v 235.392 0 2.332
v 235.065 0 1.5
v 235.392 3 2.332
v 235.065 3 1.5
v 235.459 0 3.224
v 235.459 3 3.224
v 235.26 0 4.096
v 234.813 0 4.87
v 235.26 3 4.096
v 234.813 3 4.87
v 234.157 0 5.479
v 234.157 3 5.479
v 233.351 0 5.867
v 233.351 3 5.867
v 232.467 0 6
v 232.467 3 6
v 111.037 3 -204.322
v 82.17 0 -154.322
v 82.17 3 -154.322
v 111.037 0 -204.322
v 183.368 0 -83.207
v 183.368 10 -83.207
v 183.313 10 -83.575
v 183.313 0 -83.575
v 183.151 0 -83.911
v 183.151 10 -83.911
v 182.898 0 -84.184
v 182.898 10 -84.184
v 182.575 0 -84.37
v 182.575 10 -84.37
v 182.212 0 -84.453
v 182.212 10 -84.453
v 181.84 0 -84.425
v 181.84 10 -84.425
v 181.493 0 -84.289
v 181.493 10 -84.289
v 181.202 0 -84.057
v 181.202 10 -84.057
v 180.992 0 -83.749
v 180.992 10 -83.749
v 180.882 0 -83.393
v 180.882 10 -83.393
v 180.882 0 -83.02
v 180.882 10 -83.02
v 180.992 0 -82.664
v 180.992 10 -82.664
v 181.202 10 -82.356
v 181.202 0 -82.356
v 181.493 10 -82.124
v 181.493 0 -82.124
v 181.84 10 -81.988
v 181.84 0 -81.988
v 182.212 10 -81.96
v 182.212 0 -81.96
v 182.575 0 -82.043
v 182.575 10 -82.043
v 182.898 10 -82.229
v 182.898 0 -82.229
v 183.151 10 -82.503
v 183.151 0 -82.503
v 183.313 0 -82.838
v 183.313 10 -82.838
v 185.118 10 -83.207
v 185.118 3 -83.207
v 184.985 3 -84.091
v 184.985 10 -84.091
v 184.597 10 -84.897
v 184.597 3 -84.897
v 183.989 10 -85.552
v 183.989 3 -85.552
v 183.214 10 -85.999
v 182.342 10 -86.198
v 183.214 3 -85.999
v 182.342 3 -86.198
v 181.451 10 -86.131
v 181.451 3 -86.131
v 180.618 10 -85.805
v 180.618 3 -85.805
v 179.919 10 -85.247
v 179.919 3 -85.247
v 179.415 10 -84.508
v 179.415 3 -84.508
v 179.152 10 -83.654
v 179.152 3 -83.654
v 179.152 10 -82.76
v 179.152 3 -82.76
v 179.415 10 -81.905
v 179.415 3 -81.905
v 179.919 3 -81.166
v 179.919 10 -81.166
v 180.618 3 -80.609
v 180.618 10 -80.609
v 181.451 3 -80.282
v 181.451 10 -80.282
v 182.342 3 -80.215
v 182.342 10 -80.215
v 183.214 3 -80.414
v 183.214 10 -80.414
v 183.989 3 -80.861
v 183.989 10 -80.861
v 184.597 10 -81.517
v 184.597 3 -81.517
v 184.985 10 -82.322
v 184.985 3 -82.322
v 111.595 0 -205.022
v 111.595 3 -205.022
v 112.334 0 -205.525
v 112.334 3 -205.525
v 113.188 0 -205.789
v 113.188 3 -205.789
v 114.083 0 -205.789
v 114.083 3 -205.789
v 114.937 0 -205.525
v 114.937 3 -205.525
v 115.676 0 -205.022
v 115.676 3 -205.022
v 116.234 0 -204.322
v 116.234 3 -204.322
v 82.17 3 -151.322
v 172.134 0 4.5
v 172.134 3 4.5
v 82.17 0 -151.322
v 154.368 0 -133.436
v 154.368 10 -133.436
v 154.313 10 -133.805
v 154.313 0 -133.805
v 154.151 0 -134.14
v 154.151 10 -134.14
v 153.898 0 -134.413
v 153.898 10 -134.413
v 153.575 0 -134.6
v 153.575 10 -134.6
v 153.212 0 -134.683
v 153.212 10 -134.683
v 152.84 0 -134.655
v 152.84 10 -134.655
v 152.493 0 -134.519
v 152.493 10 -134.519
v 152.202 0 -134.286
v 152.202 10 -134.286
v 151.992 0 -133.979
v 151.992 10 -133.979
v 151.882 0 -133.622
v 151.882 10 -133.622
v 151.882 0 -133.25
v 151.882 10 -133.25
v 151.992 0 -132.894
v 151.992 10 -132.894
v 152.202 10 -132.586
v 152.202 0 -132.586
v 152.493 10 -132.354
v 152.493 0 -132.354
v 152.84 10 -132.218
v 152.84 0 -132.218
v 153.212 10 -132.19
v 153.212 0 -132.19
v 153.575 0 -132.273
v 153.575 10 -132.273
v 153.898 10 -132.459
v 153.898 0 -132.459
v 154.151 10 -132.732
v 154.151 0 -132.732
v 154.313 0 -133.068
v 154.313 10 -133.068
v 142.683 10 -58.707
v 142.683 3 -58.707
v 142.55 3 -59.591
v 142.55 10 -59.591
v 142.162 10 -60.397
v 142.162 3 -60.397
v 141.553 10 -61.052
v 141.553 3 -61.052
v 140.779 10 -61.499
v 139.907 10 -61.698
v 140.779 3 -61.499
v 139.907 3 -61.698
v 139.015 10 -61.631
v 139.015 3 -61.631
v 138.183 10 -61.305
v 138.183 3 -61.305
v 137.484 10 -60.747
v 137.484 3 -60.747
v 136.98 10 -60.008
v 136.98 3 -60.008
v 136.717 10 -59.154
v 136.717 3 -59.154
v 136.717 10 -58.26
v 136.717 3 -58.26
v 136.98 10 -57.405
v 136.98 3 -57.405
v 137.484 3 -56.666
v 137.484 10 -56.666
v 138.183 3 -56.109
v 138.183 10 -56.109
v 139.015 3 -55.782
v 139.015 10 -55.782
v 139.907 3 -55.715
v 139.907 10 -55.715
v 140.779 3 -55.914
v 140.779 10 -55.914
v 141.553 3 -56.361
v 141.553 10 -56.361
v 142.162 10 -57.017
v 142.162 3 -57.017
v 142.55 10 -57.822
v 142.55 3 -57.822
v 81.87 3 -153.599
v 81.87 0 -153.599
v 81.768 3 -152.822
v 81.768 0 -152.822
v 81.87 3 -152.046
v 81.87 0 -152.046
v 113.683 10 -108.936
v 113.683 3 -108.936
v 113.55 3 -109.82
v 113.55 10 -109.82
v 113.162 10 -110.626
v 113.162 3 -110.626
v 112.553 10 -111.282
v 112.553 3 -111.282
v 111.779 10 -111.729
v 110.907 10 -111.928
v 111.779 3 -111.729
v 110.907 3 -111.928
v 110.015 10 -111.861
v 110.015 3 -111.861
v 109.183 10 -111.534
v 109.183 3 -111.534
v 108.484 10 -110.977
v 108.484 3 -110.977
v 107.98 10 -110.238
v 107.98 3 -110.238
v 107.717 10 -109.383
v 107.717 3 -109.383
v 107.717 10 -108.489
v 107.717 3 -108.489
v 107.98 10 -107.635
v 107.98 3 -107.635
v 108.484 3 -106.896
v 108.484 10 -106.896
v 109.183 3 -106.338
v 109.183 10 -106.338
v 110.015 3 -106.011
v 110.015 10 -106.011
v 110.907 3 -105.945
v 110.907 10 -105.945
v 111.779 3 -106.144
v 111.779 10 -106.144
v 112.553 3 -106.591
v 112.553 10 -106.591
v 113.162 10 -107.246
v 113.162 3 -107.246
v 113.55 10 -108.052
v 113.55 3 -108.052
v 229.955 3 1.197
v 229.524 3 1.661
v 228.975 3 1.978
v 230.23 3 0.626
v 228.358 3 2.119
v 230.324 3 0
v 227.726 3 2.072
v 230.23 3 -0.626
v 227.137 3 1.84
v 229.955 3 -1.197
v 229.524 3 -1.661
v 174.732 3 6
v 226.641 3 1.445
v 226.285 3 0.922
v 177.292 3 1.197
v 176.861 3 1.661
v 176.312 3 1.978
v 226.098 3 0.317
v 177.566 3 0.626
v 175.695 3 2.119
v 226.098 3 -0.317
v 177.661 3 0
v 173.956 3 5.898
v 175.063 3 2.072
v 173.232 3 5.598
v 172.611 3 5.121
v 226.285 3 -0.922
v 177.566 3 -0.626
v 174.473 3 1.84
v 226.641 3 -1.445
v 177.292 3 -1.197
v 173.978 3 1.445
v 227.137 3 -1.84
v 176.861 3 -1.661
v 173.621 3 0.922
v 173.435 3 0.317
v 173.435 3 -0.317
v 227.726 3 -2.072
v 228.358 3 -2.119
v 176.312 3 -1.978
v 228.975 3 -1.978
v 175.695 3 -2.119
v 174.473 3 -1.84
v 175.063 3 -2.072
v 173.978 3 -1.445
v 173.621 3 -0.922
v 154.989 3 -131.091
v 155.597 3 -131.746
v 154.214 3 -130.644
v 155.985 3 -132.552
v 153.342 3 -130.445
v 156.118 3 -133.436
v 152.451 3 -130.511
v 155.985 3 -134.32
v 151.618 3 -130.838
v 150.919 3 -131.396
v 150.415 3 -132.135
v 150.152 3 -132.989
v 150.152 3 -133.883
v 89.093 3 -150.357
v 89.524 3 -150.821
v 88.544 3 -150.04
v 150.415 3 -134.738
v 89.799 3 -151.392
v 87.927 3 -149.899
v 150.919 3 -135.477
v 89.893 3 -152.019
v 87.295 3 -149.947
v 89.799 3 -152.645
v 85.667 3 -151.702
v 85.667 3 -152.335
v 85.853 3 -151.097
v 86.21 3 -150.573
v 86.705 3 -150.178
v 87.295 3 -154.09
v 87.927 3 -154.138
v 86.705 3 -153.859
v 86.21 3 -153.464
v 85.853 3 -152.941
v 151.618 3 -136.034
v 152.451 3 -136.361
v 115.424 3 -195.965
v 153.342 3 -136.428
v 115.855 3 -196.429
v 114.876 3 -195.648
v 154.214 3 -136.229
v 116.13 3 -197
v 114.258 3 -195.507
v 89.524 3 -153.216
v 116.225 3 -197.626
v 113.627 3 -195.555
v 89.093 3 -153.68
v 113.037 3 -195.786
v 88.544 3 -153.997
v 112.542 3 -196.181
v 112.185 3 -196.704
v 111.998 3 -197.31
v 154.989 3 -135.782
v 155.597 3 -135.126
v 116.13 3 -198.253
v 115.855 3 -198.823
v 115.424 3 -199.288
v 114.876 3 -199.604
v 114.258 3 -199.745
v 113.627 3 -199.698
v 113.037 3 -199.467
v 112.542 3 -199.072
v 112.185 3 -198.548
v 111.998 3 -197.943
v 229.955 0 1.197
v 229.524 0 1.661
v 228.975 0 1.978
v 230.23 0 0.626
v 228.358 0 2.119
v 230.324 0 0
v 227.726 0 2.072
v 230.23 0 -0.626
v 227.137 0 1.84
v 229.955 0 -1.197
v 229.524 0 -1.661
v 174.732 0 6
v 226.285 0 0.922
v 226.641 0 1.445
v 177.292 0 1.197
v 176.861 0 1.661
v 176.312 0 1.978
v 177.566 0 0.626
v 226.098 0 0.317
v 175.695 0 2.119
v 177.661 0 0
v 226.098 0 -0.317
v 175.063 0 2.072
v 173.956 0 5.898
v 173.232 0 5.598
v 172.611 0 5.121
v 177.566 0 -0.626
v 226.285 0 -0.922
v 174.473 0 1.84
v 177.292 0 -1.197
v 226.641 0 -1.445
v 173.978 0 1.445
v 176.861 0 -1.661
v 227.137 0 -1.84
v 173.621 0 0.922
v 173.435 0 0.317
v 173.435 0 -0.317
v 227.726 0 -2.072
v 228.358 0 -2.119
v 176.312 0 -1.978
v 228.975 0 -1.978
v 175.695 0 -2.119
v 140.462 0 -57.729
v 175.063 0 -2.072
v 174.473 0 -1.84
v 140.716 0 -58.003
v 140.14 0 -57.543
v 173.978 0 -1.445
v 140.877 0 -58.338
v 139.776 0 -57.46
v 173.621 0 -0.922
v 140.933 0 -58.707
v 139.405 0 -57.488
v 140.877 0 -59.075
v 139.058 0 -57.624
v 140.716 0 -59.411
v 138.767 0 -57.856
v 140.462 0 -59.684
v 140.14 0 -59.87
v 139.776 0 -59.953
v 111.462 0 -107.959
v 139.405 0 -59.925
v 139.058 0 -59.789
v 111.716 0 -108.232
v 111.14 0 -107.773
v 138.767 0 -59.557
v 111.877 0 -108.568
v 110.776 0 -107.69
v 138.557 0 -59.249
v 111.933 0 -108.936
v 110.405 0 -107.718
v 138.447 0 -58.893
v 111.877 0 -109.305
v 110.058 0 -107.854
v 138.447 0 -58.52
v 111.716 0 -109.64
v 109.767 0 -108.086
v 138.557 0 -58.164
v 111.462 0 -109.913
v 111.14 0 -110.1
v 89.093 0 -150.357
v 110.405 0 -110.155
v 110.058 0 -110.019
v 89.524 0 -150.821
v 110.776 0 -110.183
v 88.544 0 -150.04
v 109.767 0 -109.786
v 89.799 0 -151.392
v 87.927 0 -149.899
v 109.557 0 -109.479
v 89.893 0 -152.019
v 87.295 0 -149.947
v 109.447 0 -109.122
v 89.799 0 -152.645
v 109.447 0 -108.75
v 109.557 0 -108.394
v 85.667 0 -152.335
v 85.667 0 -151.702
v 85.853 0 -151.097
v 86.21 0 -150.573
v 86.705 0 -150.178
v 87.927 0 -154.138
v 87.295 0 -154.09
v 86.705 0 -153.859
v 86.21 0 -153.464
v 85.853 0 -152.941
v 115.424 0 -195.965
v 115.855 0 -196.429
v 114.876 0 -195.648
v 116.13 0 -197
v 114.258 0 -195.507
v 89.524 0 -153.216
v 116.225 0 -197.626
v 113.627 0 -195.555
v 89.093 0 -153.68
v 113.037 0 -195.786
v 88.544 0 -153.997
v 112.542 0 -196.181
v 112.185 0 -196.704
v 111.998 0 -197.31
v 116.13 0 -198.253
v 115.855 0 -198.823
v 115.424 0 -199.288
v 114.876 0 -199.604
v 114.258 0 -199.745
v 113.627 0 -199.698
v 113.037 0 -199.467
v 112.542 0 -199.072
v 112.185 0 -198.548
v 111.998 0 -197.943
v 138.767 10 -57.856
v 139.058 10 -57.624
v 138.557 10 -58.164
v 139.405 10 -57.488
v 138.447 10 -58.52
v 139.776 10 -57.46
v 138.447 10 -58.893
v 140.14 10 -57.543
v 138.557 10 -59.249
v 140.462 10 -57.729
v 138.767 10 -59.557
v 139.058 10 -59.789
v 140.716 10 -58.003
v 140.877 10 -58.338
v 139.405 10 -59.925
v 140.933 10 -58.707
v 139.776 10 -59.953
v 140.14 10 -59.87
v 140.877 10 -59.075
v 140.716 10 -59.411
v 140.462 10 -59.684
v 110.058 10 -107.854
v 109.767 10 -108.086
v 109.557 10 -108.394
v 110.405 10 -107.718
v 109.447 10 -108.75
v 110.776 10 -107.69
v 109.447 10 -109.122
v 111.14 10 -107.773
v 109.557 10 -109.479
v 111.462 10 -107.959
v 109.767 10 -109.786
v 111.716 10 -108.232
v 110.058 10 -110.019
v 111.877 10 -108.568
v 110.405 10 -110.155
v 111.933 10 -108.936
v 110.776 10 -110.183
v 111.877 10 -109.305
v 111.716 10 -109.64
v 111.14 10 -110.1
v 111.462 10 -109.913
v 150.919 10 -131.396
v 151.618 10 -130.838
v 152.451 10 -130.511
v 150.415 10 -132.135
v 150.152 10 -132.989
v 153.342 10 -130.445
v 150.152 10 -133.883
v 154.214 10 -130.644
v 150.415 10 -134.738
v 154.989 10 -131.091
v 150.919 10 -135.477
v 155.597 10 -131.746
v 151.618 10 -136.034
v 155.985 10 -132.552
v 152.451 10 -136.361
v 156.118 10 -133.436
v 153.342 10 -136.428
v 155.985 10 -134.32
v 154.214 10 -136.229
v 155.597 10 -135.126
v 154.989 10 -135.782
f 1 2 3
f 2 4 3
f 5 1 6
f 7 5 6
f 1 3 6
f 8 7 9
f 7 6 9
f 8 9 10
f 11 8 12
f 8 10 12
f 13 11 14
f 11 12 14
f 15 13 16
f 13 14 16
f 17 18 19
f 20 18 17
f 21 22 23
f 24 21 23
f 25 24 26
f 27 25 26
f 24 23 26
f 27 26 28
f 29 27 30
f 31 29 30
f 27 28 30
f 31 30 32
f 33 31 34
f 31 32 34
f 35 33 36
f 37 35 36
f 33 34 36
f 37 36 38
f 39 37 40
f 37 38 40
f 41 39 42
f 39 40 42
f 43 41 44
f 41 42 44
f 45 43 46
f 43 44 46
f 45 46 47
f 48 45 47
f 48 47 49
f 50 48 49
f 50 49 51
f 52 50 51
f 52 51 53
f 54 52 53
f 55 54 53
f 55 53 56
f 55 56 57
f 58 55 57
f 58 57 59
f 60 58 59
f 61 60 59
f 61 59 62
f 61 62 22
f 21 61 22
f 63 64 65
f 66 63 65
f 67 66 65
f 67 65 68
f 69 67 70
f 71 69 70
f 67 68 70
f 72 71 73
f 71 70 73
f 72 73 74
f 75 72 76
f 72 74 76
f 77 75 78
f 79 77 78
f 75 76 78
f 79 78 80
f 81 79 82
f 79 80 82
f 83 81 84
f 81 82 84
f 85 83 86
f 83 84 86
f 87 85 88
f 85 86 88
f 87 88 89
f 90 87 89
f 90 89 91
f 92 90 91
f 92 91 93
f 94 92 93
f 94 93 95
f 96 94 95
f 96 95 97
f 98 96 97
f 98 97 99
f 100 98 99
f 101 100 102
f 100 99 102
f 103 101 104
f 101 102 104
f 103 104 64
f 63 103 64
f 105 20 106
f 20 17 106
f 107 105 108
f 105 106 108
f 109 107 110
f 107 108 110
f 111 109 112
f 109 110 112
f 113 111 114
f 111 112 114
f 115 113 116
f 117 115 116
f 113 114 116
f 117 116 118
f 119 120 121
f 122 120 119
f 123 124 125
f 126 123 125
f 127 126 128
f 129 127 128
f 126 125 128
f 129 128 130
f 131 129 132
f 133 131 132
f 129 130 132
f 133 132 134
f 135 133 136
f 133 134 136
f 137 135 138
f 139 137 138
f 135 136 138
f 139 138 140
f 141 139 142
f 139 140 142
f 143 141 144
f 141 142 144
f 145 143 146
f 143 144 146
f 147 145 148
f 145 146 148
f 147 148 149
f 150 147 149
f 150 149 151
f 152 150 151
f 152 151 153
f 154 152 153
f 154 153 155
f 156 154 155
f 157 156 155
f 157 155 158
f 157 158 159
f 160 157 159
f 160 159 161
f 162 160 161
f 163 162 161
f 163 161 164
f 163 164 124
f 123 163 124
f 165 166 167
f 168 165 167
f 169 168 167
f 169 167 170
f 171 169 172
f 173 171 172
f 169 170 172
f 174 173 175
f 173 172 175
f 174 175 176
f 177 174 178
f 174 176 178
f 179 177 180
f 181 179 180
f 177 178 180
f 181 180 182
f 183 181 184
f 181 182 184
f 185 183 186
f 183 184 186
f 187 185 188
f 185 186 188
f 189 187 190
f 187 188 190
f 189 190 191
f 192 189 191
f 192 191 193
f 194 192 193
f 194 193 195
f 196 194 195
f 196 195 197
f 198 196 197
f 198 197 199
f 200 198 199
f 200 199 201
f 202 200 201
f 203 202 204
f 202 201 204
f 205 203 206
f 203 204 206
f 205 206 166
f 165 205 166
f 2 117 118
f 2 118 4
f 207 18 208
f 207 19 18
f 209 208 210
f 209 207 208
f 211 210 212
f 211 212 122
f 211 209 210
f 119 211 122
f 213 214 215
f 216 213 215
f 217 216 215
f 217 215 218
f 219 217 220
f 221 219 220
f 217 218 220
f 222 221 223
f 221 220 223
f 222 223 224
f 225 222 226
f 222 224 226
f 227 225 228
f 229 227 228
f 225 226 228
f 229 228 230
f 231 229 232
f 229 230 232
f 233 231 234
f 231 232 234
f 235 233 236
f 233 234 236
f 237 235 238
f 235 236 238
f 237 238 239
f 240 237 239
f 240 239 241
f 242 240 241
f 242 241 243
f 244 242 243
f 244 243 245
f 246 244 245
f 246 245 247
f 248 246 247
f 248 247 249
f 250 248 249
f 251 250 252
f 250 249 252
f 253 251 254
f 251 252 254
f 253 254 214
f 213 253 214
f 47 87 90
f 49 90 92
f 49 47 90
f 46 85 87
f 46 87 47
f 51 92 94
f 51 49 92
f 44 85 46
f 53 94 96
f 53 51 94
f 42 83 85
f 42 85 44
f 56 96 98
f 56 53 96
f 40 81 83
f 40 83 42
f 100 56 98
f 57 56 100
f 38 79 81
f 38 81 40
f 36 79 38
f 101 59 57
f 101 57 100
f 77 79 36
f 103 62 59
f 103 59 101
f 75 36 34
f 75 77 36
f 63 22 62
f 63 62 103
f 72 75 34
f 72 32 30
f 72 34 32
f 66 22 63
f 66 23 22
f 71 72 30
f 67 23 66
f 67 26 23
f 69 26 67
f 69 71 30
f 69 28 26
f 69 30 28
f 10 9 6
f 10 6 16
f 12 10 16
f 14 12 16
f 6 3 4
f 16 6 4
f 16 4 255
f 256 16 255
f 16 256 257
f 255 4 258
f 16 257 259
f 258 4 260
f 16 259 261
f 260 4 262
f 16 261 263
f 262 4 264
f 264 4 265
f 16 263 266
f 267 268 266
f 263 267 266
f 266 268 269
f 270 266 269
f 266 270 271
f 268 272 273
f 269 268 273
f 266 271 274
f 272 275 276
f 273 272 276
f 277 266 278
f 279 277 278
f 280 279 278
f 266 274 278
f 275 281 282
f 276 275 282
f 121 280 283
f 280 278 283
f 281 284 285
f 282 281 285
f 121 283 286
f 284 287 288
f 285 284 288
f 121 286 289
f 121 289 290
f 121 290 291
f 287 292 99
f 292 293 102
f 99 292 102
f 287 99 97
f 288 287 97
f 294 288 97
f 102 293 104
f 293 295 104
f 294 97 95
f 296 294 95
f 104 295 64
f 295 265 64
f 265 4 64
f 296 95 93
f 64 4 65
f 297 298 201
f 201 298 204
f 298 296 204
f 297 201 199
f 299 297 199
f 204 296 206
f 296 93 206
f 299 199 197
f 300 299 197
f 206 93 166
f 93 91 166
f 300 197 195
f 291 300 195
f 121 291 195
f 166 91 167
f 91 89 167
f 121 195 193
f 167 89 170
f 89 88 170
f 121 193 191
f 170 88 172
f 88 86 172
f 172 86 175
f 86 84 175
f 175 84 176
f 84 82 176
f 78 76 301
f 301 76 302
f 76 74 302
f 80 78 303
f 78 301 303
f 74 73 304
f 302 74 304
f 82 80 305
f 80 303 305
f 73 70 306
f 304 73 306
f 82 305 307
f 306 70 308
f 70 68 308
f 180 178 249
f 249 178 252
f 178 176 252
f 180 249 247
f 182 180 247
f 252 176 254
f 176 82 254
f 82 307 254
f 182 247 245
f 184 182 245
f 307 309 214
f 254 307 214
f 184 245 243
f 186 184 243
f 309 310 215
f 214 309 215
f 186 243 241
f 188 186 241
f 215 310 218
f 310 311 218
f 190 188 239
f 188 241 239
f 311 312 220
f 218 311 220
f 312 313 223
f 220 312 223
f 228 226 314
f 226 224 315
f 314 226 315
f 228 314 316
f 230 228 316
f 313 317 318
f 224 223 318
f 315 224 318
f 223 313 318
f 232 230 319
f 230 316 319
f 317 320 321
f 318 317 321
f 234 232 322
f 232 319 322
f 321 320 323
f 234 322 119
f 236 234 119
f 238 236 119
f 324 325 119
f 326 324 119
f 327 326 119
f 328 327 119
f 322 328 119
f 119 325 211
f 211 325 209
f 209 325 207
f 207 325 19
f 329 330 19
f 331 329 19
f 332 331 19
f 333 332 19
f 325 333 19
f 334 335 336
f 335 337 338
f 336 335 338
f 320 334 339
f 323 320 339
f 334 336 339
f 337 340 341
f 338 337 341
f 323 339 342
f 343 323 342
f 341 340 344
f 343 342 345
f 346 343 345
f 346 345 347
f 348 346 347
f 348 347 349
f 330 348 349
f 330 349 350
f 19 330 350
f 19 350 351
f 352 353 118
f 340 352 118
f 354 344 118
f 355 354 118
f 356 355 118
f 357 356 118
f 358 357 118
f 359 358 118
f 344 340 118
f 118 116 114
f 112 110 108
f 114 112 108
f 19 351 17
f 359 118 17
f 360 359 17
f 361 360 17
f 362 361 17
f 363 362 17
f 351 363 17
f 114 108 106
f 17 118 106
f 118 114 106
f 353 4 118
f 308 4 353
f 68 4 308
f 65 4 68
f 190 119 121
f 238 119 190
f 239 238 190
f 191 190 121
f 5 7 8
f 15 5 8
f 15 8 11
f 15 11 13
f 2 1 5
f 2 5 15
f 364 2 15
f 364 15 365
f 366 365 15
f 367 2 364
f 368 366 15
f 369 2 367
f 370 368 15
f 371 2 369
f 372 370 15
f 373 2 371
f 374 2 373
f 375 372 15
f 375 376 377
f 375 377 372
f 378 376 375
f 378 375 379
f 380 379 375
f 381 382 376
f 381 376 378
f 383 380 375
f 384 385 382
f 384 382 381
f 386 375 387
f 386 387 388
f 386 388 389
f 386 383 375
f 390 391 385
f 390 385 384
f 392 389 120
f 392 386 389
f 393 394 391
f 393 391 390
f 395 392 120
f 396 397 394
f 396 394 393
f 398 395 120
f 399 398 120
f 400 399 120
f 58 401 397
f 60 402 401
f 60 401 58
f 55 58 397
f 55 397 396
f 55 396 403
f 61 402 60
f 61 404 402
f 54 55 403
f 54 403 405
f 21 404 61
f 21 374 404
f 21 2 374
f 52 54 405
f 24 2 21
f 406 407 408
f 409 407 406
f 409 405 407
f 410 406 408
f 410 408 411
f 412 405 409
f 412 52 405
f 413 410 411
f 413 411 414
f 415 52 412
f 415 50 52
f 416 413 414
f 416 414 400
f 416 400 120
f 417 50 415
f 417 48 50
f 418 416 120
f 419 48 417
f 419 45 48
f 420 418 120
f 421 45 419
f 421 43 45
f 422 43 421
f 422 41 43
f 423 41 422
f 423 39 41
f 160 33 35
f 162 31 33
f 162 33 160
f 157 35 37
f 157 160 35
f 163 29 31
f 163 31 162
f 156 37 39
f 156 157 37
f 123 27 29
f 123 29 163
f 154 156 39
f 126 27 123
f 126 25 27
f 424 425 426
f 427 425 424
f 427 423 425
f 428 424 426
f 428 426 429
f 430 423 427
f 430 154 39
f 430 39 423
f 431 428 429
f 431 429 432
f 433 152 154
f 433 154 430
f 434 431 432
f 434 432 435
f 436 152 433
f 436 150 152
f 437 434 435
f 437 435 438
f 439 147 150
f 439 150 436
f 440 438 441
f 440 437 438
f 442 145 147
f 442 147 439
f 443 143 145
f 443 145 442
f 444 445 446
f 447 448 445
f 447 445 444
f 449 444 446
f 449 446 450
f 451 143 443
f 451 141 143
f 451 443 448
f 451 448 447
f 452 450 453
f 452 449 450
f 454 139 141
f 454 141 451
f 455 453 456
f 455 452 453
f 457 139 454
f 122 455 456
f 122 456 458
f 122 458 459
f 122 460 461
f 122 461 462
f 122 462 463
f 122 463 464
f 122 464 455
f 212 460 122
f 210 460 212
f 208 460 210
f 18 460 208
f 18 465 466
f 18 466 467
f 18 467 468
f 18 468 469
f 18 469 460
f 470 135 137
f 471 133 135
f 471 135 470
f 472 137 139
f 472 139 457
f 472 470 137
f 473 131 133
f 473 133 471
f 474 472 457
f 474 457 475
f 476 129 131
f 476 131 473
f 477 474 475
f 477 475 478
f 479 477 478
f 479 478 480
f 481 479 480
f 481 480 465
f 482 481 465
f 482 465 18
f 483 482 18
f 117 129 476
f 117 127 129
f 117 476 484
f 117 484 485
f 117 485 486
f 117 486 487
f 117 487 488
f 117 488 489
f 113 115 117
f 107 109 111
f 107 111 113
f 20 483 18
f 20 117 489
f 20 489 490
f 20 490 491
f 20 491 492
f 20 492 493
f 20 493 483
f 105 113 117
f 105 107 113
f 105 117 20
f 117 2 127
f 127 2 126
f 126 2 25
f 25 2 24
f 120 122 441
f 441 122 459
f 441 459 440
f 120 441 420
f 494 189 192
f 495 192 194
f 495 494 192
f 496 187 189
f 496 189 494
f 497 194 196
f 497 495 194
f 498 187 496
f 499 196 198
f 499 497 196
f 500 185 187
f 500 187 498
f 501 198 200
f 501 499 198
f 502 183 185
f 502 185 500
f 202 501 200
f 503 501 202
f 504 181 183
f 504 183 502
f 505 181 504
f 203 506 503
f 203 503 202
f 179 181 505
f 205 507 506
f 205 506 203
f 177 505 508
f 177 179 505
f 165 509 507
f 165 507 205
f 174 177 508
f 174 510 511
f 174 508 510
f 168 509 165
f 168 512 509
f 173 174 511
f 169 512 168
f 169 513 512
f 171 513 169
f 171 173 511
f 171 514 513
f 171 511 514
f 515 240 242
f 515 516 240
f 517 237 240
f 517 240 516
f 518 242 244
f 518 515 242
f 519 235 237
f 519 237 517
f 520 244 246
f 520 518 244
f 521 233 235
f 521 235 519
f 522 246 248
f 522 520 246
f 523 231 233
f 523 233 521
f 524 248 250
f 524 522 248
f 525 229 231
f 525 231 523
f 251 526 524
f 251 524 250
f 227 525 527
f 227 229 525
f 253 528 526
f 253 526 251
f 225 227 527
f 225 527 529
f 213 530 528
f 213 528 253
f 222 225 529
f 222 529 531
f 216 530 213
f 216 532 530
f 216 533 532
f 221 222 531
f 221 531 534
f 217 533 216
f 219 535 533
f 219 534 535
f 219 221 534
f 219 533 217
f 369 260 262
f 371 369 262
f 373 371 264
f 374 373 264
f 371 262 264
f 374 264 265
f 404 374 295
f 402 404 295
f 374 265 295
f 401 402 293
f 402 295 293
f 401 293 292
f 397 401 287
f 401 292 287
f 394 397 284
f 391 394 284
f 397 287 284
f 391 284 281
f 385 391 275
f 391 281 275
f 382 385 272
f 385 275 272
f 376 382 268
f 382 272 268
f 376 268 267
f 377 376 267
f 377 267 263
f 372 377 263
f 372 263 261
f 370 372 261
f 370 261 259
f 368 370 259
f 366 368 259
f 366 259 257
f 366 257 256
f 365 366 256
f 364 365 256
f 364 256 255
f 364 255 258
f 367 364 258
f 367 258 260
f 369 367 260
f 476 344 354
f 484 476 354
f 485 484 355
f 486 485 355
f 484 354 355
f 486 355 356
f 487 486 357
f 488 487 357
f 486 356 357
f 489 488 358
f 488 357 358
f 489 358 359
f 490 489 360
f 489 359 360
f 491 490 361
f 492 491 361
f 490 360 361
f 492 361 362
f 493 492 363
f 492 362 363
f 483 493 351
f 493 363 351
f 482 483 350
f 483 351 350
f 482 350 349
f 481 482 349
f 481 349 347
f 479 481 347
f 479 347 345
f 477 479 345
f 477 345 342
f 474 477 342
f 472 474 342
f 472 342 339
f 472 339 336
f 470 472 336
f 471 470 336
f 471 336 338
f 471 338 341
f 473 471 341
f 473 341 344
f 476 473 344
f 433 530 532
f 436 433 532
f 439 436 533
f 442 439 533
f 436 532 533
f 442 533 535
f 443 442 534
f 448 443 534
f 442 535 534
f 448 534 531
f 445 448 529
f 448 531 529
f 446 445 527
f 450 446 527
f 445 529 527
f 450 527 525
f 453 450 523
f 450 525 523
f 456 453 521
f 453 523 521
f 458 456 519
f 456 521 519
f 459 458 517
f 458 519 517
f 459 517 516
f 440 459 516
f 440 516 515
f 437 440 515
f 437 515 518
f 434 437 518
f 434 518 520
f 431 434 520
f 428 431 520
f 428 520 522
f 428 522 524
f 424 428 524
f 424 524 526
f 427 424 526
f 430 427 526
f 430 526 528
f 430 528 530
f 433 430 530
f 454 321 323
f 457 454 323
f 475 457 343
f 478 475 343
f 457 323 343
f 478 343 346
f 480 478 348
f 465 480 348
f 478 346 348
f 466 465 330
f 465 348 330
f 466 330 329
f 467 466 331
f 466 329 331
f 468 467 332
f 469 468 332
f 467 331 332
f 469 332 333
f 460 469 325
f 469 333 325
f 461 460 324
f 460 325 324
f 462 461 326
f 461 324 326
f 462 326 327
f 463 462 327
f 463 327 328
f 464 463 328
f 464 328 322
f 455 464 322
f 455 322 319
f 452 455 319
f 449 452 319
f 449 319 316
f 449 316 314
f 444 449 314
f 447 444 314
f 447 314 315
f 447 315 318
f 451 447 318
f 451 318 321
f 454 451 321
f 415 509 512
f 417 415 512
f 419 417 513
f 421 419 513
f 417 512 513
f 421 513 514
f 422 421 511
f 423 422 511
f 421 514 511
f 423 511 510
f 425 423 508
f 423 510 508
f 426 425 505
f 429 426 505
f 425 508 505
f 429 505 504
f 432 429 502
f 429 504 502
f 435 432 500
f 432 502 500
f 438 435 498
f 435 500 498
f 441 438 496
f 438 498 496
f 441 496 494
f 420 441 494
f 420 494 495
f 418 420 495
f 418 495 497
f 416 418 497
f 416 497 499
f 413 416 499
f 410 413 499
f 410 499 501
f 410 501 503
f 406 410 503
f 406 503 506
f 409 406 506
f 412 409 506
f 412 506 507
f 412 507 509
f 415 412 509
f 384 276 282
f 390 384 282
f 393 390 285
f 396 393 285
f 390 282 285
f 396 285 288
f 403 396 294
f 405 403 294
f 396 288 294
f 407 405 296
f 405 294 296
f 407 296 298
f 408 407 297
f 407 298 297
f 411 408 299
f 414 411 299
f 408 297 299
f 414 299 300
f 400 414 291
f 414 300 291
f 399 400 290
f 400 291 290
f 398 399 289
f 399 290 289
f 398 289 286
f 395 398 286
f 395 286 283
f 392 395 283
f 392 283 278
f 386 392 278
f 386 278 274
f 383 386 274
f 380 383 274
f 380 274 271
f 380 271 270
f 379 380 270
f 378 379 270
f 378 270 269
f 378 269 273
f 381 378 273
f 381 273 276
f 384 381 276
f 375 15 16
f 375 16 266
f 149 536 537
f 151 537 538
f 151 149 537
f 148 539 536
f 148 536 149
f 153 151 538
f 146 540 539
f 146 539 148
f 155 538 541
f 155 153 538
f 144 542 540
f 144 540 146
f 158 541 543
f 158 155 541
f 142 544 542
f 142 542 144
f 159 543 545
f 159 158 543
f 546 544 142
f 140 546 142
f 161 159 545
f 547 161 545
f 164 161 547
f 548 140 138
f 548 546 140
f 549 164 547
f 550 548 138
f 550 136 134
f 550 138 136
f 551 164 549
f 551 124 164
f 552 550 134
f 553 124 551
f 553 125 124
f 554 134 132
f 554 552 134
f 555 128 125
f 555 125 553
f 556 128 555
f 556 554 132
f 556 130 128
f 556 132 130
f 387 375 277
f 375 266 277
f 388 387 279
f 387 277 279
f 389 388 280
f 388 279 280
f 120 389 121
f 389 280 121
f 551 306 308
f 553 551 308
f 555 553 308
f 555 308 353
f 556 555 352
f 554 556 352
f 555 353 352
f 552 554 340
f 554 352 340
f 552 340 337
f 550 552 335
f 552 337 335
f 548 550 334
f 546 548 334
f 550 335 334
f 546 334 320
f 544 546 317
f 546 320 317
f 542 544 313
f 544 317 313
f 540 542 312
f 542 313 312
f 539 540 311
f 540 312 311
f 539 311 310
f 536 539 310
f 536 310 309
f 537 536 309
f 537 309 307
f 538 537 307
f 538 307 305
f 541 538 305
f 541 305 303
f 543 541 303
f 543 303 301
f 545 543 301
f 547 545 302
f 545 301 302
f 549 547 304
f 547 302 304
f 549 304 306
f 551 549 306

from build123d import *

# Parameters (mm, degrees)
BOSS_EXTRUDE1_DEPTH = 3
FILLET1_R           = 3
SKETCH2_R           = 3
BOSS_EXTRUDE2_DEPTH = 7
SKETCH3_R           = 1.25
CUT_EXTRUDE1_DEPTH  = 11
SKETCH4_R           = 2.125
CUT_EXTRUDE2_DEPTH  = 4


with BuildPart() as part:
    # Sketch1 → Boss-Extrude1 (new body)
    with BuildSketch(Plane(origin=(0, 0, 0), x_dir=(1, 0, 0), z_dir=(0, 1, 0))):
        Polygon((81.303847577, 152.822394855), (113.635462652, 208.822394855), (237.663230149, -6), (173, -6), align=None)
    extrude(amount=BOSS_EXTRUDE1_DEPTH)

    # Fillet1
    fillet1_edges = [part.edges().sort_by_distance(p)[0] for p in [
        (173, 1.5, 6),
        (81.303847577, 1.5, -152.822394855),
        (113.635462652, 1.5, -208.822394855),
        (237.663230149, 1.5, 6),
    ]]
    fillet(fillet1_edges, radius=FILLET1_R)

    # Sketch2 → Boss-Extrude2 (add)
    with BuildSketch(Plane(origin=(0, 3, 0), x_dir=(1, 0, 0), z_dir=(0, 1, 0))):
        with Locations((110.683012702, 108.936188175)):
            Circle(SKETCH2_R)
        with Locations((153.118257487, 133.436188175)):
            Circle(SKETCH2_R)
        with Locations((182.118257487, 83.206714755)):
            Circle(SKETCH2_R)
        with Locations((139.683012702, 58.706714755)):
            Circle(SKETCH2_R)
    extrude(amount=BOSS_EXTRUDE2_DEPTH)

    # Sketch3 → Cut-Extrude1 (cut, through all)
    with BuildSketch(Plane(origin=(0, 10, 0), x_dir=(1, 0, 0), z_dir=(0, 1, 0))):
        with Locations((110.683012702, 108.936188175)):
            Circle(SKETCH3_R)
        with Locations((153.118257487, 133.436188175)):
            Circle(SKETCH3_R)
        with Locations((182.118257487, 83.206714755)):
            Circle(SKETCH3_R)
        with Locations((139.683012702, 58.706714755)):
            Circle(SKETCH3_R)
    extrude(amount=-CUT_EXTRUDE1_DEPTH, mode=Mode.SUBTRACT)

    # Sketch4 → Cut-Extrude2 (cut, through all)
    with BuildSketch(Plane(origin=(0, 3, 0), x_dir=(1, 0, 0), z_dir=(0, 1, 0))):
        with Locations((87.767949192, 152.018547277)):
            Circle(SKETCH4_R)
        with Locations((114.099564267, 197.626242432)):
            Circle(SKETCH4_R)
        with Locations((175.535898385, 0)):
            Circle(SKETCH4_R)
        with Locations((228.199128534, 0)):
            Circle(SKETCH4_R)
    extrude(amount=-CUT_EXTRUDE2_DEPTH, mode=Mode.SUBTRACT)


solid = part.part
